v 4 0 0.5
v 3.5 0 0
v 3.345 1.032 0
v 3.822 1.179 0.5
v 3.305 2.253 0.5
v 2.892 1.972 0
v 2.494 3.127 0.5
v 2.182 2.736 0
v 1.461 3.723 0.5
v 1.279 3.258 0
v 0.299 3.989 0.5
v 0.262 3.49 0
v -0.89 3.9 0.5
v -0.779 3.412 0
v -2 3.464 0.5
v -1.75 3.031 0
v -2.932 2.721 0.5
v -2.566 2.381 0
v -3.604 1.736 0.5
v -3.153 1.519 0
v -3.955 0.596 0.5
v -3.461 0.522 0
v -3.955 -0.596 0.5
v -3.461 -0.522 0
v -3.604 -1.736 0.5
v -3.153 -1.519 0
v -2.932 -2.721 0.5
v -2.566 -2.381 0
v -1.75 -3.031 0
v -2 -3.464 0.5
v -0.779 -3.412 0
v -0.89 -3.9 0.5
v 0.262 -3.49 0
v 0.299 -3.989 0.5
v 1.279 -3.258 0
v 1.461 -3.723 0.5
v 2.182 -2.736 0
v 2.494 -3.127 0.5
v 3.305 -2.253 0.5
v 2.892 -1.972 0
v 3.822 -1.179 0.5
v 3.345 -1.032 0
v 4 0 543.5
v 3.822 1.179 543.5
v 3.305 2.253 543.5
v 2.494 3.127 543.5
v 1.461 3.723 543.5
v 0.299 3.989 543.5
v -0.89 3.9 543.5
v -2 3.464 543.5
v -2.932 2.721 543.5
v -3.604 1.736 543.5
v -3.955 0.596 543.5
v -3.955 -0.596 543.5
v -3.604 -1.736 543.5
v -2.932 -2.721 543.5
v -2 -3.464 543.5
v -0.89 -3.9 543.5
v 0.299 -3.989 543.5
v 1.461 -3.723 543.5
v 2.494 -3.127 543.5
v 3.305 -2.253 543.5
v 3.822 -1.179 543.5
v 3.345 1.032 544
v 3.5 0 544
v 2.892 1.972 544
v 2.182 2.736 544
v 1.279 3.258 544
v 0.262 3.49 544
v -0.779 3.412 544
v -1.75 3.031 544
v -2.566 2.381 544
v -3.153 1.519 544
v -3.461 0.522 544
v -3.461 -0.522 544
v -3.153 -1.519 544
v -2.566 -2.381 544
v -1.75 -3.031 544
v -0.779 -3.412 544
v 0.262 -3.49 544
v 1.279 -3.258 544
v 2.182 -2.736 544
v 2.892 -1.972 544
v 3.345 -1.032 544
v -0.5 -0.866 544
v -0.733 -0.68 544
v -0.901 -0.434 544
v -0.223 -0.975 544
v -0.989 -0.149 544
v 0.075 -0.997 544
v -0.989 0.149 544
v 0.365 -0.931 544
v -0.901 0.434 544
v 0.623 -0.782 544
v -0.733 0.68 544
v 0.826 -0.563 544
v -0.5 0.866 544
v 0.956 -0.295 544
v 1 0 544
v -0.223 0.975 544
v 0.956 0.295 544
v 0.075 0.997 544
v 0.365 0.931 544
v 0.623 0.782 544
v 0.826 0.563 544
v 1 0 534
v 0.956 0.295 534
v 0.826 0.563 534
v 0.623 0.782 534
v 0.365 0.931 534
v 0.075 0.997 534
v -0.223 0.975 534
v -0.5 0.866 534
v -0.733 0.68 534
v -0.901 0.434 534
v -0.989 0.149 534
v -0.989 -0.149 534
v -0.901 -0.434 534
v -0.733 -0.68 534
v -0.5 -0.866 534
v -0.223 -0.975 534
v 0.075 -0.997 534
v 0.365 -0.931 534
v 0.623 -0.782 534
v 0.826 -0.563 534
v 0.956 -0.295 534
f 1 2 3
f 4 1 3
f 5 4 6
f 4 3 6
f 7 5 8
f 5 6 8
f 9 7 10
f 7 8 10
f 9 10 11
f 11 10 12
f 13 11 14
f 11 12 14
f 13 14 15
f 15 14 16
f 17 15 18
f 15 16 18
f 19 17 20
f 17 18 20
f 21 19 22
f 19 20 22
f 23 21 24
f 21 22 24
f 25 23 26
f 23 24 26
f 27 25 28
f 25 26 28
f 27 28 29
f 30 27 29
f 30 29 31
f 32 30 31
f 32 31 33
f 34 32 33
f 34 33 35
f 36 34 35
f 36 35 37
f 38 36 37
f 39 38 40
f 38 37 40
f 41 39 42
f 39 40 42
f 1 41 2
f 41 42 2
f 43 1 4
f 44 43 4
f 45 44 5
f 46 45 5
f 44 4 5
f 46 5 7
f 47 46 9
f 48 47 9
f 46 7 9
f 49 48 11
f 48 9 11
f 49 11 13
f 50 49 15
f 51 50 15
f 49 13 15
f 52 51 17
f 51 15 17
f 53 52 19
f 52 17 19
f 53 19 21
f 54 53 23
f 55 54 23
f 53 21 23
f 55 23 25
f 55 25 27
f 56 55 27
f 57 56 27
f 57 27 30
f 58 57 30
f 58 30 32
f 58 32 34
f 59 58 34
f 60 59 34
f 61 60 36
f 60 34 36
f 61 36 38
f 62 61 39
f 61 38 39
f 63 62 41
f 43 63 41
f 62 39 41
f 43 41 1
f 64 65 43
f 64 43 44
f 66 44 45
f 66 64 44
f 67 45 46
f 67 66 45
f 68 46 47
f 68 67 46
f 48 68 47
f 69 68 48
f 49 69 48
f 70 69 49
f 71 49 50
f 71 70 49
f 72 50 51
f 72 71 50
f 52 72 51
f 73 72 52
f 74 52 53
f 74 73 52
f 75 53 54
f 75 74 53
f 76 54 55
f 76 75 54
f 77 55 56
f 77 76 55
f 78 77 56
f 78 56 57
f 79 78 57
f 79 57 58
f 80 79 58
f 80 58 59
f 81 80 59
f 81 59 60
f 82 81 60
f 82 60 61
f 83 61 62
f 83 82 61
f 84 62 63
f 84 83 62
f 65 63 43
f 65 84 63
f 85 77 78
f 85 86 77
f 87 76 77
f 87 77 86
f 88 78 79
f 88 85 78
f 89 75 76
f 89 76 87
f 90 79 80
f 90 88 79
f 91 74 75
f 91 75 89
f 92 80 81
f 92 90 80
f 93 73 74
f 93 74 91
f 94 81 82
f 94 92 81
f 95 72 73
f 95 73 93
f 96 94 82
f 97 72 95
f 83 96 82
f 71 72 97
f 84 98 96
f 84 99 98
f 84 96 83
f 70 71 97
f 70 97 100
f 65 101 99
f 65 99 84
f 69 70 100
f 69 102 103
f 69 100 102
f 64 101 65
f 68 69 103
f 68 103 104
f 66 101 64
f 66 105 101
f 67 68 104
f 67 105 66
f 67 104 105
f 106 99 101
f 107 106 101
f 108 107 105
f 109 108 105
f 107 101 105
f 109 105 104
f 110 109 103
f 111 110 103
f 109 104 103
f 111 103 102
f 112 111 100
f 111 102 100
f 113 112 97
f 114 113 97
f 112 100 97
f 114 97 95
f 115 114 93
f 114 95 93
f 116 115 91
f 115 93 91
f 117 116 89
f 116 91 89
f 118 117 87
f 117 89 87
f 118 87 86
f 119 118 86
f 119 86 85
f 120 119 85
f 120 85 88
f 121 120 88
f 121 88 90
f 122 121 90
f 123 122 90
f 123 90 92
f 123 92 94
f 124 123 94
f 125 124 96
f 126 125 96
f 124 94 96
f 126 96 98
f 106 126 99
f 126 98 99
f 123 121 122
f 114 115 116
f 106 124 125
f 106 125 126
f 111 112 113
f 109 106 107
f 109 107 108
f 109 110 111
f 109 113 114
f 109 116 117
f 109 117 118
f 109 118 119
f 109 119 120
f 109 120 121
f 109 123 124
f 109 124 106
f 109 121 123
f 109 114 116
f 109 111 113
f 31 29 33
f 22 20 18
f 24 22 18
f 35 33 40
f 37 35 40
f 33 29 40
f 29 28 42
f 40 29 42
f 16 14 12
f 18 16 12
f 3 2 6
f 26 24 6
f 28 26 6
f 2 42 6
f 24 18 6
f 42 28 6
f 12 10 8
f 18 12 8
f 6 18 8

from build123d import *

# Parameters (mm, degrees)
SKETCH1_R           = 4
BOSS_EXTRUDE1_DEPTH = 544
SKETCH2_R           = 1
CUT_EXTRUDE1_DEPTH  = 10
CHAMFER1_SIZE       = 0.5


with BuildPart() as part:
    # Sketch1 → Boss-Extrude1 (new body)
    with BuildSketch(Plane.XY):
        Circle(SKETCH1_R)
    extrude(amount=BOSS_EXTRUDE1_DEPTH)

    # Sketch2 → Cut-Extrude1 (cut)
    with BuildSketch(Plane.XY.offset(544)):
        Circle(SKETCH2_R)
    extrude(amount=-CUT_EXTRUDE1_DEPTH, mode=Mode.SUBTRACT)

    # Chamfer1
    chamfer1_edges = [part.edges().sort_by_distance(p)[0] for p in [
        (-4, 0, 0),
        (-4, 0, 544),
    ]]
    chamfer(chamfer1_edges, length=CHAMFER1_SIZE)


solid = part.part
